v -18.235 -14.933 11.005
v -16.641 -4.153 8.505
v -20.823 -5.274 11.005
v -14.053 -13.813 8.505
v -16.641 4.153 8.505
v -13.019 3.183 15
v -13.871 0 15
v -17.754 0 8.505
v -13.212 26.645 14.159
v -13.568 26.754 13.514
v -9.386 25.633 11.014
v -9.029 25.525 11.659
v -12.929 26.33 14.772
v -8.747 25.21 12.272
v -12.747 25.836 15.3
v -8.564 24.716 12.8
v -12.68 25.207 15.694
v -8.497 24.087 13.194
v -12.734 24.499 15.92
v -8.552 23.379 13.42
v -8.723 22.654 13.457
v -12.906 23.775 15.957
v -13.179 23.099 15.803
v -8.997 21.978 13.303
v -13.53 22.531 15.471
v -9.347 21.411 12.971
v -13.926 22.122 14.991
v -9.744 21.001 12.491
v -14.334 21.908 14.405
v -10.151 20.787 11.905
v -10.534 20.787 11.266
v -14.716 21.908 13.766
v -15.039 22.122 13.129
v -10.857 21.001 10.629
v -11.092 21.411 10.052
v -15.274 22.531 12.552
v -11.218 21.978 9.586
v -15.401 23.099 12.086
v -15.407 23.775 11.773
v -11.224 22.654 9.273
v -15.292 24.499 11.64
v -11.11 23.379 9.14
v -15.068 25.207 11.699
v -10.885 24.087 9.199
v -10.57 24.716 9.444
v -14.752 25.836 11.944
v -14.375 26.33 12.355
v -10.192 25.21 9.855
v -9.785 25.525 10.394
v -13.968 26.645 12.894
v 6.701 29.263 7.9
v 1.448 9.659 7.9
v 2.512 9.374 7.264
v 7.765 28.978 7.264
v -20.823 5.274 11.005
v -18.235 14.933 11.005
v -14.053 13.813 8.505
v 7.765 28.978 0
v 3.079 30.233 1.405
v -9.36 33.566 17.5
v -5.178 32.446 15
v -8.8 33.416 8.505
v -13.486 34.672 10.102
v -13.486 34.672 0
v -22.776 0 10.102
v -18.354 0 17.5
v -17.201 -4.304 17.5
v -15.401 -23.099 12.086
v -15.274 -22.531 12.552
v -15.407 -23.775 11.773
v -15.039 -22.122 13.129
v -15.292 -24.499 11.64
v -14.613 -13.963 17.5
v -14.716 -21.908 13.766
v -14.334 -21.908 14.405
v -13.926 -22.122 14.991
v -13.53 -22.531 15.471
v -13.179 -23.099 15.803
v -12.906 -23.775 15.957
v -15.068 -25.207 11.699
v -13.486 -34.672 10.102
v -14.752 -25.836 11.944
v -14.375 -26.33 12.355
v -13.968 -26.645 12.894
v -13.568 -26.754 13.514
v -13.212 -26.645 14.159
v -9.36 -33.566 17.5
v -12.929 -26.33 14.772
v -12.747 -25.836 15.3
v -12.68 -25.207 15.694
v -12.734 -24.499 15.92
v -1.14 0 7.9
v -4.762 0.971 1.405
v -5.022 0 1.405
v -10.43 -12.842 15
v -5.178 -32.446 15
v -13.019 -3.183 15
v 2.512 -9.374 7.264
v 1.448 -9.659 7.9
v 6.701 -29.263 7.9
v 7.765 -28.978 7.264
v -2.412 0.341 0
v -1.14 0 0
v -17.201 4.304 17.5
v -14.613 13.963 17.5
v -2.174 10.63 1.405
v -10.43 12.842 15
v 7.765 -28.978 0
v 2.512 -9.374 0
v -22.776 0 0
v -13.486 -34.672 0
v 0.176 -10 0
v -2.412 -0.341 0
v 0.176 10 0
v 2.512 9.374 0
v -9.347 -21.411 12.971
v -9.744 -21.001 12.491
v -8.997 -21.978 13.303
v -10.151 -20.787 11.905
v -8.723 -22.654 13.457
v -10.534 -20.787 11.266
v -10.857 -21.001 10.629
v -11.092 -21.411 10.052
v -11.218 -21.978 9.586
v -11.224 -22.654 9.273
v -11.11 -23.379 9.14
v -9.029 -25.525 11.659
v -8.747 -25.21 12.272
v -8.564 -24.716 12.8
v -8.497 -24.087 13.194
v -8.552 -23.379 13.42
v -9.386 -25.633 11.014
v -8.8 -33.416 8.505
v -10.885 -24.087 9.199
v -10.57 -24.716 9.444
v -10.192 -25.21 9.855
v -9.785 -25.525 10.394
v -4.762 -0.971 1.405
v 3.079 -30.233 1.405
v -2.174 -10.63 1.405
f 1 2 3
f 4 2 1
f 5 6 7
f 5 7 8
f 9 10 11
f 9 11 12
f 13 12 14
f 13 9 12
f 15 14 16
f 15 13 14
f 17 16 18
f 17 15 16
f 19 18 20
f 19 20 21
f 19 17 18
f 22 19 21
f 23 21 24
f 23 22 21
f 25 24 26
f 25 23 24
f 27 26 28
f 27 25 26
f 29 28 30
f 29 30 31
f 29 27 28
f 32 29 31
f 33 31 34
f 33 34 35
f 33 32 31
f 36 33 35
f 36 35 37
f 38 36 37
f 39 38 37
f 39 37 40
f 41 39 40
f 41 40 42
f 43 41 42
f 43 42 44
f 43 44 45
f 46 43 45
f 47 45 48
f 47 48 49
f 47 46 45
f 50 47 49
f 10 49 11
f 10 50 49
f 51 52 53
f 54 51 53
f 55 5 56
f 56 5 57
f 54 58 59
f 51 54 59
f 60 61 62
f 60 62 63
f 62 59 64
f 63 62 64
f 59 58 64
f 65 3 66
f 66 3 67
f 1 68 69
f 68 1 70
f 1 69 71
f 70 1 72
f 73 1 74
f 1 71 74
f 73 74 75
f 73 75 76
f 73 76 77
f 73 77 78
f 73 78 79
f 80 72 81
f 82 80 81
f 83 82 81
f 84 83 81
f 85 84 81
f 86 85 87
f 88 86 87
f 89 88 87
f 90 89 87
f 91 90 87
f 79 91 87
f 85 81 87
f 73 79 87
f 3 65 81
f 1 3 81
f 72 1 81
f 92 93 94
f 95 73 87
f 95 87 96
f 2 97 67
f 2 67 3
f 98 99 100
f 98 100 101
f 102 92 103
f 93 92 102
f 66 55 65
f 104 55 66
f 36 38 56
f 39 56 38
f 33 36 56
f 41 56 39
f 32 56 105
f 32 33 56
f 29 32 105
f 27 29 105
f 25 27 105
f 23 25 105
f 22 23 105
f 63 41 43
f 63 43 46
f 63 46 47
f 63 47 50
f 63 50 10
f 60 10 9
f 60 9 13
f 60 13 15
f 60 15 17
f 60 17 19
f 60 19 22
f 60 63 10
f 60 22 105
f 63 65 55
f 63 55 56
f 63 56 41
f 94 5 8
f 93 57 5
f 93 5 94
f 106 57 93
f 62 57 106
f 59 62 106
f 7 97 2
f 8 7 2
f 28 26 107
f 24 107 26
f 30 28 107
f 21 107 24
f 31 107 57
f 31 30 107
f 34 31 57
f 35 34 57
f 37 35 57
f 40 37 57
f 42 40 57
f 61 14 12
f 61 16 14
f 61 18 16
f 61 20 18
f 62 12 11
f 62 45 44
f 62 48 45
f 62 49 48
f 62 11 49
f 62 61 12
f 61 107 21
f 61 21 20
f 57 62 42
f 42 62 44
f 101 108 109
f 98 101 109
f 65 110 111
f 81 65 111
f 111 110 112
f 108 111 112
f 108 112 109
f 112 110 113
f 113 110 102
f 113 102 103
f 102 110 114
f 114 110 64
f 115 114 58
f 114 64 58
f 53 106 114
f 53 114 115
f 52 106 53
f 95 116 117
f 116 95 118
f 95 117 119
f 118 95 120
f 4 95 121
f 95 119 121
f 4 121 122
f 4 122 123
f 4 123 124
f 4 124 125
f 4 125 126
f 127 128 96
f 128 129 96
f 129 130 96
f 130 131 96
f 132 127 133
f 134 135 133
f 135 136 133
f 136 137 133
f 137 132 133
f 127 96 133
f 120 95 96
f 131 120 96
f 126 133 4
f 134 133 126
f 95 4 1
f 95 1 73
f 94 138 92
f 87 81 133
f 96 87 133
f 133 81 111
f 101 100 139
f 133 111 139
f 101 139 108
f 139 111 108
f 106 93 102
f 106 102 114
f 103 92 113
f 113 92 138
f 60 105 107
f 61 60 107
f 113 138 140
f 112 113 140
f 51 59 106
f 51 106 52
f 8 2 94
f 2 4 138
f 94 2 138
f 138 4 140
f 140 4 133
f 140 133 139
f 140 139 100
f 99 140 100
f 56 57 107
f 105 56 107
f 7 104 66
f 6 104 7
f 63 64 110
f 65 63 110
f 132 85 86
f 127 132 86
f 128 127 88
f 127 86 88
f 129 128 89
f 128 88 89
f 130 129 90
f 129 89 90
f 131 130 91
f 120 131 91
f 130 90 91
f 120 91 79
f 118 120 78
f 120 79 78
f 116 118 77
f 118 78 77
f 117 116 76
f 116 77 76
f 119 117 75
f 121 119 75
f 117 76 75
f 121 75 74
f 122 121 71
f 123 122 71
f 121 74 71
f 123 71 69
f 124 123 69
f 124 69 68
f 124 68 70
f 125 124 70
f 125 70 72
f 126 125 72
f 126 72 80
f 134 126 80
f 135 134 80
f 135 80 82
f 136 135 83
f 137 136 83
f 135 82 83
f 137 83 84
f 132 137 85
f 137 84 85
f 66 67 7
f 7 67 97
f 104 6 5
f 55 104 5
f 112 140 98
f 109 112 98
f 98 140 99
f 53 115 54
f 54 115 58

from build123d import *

# Parameters (mm, degrees)
F1_DEPTH       = 20
F4_REACH       = 59.8904911491
F6_REACH       = 49.0077165035
F8_DEPTH       = 17.7213446758
F8_DEPTH_BACK  = 25
F10_REACH      = 31.5666498146
F12_DEPTH      = 19.1713446758
F12_DEPTH_BACK = 31.9213446758
F13_R          = 2.5
F14_DEPTH      = 5


with BuildPart() as f1:
    # F0 (on Top) → F1 (new body)
    with BuildSketch(Plane.XY):
        Polygon((7.7645713531, -28.9777747887), (0, 0), (7.7645713531, 28.9777747887), (-13.4857968253, 34.6717937809), (-22.776075969, 0), (-13.4857968253, -34.6717937809), align=None)
    extrude(amount=F1_DEPTH)

    f4_end = Plane(origin=(0, 0, 20), x_dir=(0, 0, 1), z_dir=(0, 1, 0))
    # F3 (on face) → F4 (cut, up to a plane its end follows)
    with BuildSketch(Plane(origin=(7.7645713531, -28.9777747887, 0), x_dir=(0.9659258263, 0.2588190451, 0), z_dir=(0.2588190451, -0.9659258263, 0))):
        Polygon((-13.3987803669, 15), (-17.1487803669, 8.5048094716), (-4.8512196331, 1.4048094716), (-1.1012196331, 7.9), (0, 7.9), (0, 20), (-13.3987803669, 20), align=None)
    f4_long = extrude(amount=-F4_REACH, mode=Mode.PRIVATE)
    add(split(f4_long, bisect_by=f4_end, keep=Keep.BOTTOM, mode=Mode.PRIVATE), mode=Mode.SUBTRACT)

    f6_end = Plane(origin=(0, 0, 20), x_dir=(0, 0, 1), z_dir=(0, 1, 0))
    # F5 (on face) → F6 (cut, up to a plane its end follows)
    with BuildSketch(Plane(origin=(7.7645713531, -28.9777747887, 0), x_dir=(0.9659258263, 0.2588190451, 0), z_dir=(0.2588190451, -0.9659258263, 0))):
        Polygon((-22, 20), (-22, 10.1022505884), (-17.7289073858, 17.5), (-13.3987803669, 15), (-13.3987803669, 20), align=None)
    f6_long = extrude(amount=-F6_REACH, mode=Mode.PRIVATE)
    add(split(f6_long, bisect_by=f6_end, keep=Keep.BOTTOM, mode=Mode.PRIVATE), mode=Mode.SUBTRACT)

    # F7 (on face) → F8 (cut, two sides)
    with BuildSketch(Plane(origin=(-15.9805432759, -4.2819736654, 9.5518420887), x_dir=(-0.1923952931, 0.9745560663, 0.1149979338), z_dir=(0.8365163037, 0.224143868, -0.5))) as f8_sk:
        Polygon((-28.8989639862, 10.218925907), (-36.8281195036, 11.2812313158), (-37.8240308243, 3.8476480182), (-29.8948753069, 2.7853426095), align=None)
    extrude(amount=-F8_DEPTH, mode=Mode.SUBTRACT)
    extrude(f8_sk.sketch, amount=F8_DEPTH_BACK, mode=Mode.SUBTRACT)

    f10_end = Plane(origin=(0, 0, 20), x_dir=(0, 0, 1), z_dir=(0, 1, 0))
    # F9 (on face) → F10 (cut, up to a plane its end follows)
    with BuildSketch(Plane(origin=(7.7645713531, -28.9777747887, 0), x_dir=(0.9659258263, 0.2588190451, 0), z_dir=(0.2588190451, -0.9659258263, 0))):
        Polygon((0, 7.9), (-1.1012196331, 7.9), (0, 7.2642105484), align=None)
    f10_long = extrude(amount=-F10_REACH, mode=Mode.PRIVATE)
    add(split(f10_long, bisect_by=f10_end, keep=Keep.BOTTOM, mode=Mode.PRIVATE), mode=Mode.SUBTRACT)

    # F11 (on face) → F12 (cut, two sides)
    with BuildSketch(Plane(origin=(-4.1020117628, -1.0991307392, 2.4518420887), x_dir=(0.1923952931, -0.9745560663, -0.1149979338), z_dir=(-0.8365163037, -0.224143868, 0.5))) as f12_sk:
        Polygon((8.7836172997, 7.5239804569), (-1.127827097, 6.196098696), (-0.1319157763, -1.2374846015), (9.7795286204, 0.0903971594), align=None)
    extrude(amount=-F12_DEPTH, mode=Mode.SUBTRACT)
    extrude(f12_sk.sketch, amount=F12_DEPTH_BACK, mode=Mode.SUBTRACT)

    # F13 (on face) → F14 (cut, through all)
    with BuildSketch(Plane(origin=(-20.1631247946, -5.4026930056, 12.0518420887), x_dir=(0.1923952931, -0.9745560663, -0.1149979338), z_dir=(-0.8365163037, -0.224143868, 0.5))):
        with Locations((19.4084412411, 4.6381834861)):
            Circle(F13_R)
    extrude(amount=-F14_DEPTH, mode=Mode.SUBTRACT)

    # F15: F1 across plane


with BuildPart() as f1_1:
    add(f1.part)
    add(f1.part.mirror(Plane.XZ), mode=Mode.INTERSECT)


solid = f1_1.part
